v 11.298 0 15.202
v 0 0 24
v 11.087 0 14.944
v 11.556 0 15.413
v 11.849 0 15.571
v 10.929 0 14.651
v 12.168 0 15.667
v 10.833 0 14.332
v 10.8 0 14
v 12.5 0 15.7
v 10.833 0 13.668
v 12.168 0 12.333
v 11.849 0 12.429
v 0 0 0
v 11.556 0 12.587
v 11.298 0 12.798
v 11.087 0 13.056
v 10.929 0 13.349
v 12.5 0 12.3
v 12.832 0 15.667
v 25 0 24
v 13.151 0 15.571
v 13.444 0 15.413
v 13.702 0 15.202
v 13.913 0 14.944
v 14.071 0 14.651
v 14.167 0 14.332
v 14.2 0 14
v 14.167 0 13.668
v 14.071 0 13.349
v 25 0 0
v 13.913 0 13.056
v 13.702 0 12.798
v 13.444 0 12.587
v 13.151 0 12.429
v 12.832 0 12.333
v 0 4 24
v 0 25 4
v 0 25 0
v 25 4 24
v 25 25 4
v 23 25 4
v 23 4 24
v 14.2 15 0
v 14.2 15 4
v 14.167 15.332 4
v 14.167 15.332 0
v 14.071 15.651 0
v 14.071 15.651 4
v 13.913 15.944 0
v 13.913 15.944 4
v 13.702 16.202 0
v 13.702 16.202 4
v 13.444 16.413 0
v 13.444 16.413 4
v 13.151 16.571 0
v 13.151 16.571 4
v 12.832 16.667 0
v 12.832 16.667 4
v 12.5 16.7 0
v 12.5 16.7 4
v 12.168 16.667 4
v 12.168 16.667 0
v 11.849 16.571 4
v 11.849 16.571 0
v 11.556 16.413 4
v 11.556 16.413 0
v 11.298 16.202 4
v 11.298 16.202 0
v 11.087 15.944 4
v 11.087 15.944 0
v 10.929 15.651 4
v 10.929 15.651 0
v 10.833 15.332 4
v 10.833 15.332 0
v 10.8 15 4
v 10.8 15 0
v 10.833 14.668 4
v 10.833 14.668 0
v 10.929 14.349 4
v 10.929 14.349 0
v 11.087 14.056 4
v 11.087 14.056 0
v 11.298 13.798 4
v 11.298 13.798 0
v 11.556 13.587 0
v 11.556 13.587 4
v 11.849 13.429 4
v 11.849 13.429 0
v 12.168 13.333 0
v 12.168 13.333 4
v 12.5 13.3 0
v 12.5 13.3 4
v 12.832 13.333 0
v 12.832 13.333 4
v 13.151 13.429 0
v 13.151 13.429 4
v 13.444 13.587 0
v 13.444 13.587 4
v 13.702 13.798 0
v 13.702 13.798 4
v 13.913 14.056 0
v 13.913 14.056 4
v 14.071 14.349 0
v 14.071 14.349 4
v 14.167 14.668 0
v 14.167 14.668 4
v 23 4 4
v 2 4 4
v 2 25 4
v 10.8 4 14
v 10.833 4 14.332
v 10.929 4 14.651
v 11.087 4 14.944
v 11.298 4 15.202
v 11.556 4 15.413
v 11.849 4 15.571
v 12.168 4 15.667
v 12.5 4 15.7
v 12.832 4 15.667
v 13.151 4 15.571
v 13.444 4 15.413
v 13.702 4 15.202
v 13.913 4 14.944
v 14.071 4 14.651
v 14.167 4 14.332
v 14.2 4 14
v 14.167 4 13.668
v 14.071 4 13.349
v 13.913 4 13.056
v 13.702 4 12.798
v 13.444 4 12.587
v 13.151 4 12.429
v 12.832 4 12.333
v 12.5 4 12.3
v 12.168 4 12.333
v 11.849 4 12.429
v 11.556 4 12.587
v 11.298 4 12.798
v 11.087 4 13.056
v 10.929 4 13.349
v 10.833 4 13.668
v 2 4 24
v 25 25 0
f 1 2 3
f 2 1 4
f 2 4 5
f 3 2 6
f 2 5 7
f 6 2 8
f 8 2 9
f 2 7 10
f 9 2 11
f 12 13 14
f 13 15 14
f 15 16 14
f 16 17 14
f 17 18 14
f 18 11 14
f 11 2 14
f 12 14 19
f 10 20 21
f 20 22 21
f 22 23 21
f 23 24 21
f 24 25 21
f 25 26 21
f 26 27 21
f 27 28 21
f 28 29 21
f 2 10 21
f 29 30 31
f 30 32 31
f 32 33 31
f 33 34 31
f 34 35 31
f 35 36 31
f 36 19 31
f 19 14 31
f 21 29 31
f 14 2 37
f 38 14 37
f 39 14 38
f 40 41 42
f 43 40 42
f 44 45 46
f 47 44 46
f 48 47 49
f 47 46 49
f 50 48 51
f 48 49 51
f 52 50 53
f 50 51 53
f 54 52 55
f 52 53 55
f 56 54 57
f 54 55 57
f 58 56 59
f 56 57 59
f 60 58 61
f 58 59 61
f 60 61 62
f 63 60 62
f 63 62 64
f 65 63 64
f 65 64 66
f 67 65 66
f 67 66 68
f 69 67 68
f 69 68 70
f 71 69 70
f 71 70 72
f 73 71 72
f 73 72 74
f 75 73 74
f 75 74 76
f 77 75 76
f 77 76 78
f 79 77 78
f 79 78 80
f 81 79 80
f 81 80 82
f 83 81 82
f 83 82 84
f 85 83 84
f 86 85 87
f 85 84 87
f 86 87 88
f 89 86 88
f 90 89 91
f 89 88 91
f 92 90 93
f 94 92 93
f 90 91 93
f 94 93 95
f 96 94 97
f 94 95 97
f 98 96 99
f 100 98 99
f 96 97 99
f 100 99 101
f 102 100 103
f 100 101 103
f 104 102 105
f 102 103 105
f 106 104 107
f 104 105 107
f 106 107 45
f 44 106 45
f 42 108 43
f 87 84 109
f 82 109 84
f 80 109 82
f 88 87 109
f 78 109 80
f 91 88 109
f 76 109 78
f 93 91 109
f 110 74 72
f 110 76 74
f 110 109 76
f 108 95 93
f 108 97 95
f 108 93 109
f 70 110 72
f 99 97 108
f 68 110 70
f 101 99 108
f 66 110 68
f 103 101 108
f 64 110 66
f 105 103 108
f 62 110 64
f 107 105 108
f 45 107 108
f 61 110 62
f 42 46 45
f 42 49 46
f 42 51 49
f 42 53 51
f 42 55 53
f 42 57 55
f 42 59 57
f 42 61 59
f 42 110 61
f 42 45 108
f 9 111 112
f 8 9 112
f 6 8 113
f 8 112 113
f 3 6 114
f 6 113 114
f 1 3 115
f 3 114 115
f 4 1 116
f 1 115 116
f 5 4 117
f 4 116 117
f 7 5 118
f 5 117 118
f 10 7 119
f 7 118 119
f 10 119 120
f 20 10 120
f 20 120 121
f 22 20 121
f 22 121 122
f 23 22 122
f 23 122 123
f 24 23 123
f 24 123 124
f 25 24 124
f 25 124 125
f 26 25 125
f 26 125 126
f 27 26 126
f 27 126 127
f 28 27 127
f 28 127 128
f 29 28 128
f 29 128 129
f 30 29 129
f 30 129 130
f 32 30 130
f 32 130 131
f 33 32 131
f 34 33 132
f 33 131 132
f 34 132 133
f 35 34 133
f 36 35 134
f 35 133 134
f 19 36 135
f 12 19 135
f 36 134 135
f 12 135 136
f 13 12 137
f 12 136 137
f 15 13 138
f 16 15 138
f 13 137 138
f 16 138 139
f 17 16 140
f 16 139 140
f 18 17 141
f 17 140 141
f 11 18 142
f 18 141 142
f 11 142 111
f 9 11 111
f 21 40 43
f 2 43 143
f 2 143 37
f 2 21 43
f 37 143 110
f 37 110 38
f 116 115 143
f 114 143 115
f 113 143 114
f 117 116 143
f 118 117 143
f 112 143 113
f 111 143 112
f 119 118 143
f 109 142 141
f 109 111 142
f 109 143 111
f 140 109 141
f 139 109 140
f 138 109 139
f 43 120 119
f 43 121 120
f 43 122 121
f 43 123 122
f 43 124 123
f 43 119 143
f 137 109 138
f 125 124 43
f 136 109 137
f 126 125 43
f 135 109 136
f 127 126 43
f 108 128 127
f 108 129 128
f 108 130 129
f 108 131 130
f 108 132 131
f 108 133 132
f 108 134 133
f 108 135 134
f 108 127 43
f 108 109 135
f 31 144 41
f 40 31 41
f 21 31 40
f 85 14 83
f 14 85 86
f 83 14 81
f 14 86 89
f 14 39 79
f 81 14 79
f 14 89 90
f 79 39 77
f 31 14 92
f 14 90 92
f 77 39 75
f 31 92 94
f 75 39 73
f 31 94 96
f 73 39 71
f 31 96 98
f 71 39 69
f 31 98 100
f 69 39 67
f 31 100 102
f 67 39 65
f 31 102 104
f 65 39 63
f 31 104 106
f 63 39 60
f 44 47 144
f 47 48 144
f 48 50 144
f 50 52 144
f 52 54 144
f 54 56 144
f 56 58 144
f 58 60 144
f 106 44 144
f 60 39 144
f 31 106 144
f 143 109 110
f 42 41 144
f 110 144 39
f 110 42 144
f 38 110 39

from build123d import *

# Parameters (mm, degrees)
F0_W      = 25
F0_H      = 25
F1_DEPTH  = 4
F2_W      = 25
F2_H      = 4
F3_DEPTH  = 20
F4_W      = 2
F4_H      = 20
F5_DEPTH  = 21
F6_SIZE2  = 20
F6_SIZE   = 21
F7_R      = 1.7
F8_DEPTH  = 25
F9_R      = 1.7
F10_DEPTH = 25


with BuildPart() as f1:
    # F0 (on Top) → F1 (new body)
    with BuildSketch(Plane.XY):
        with Locations((12.5, 12.5)):
            Rectangle(F0_W, F0_H)
    extrude(amount=F1_DEPTH)

    # F2 (on face) → F3 (join)
    with BuildSketch(Plane.XY.offset(4)):
        with Locations((12.5, 2)):
            Rectangle(F2_W, F2_H)
    extrude(amount=F3_DEPTH)

    # F4 (on face) → F5 (join)
    with BuildSketch(Plane(origin=(0, 4, 0), x_dir=(-1, 0, 0), z_dir=(0, 1, 0))):
        with Locations((-24, 14)):
            Rectangle(F4_W, F4_H)
        with Locations((-1, 14)):
            Rectangle(F4_W, F4_H)
    extrude(amount=F5_DEPTH)

    # F6
    f6_edges = [f1.edges().sort_by_distance(p)[0] for p in [
        (24, 25, 24),
        (1, 25, 24),
    ]]
    f6_side = f1.faces().sort_by_distance((0.353553, 12.5, 24))[0]
    chamfer(f6_edges, length=F6_SIZE, length2=F6_SIZE2, reference=f6_side)

    # F7 (on face) → F8 (cut)
    with BuildSketch(Plane(origin=(0, 4, 0), x_dir=(-1, 0, 0), z_dir=(0, 1, 0))):
        with Locations((-12.5, 14)):
            Circle(F7_R)
    extrude(amount=-F8_DEPTH, mode=Mode.SUBTRACT)

    # F9 (on face) → F10 (cut)
    with BuildSketch(Plane.XY.offset(4)):
        with Locations((12.5, 15)):
            Circle(F9_R)
    extrude(amount=-F10_DEPTH, mode=Mode.SUBTRACT)


solid = f1.part
